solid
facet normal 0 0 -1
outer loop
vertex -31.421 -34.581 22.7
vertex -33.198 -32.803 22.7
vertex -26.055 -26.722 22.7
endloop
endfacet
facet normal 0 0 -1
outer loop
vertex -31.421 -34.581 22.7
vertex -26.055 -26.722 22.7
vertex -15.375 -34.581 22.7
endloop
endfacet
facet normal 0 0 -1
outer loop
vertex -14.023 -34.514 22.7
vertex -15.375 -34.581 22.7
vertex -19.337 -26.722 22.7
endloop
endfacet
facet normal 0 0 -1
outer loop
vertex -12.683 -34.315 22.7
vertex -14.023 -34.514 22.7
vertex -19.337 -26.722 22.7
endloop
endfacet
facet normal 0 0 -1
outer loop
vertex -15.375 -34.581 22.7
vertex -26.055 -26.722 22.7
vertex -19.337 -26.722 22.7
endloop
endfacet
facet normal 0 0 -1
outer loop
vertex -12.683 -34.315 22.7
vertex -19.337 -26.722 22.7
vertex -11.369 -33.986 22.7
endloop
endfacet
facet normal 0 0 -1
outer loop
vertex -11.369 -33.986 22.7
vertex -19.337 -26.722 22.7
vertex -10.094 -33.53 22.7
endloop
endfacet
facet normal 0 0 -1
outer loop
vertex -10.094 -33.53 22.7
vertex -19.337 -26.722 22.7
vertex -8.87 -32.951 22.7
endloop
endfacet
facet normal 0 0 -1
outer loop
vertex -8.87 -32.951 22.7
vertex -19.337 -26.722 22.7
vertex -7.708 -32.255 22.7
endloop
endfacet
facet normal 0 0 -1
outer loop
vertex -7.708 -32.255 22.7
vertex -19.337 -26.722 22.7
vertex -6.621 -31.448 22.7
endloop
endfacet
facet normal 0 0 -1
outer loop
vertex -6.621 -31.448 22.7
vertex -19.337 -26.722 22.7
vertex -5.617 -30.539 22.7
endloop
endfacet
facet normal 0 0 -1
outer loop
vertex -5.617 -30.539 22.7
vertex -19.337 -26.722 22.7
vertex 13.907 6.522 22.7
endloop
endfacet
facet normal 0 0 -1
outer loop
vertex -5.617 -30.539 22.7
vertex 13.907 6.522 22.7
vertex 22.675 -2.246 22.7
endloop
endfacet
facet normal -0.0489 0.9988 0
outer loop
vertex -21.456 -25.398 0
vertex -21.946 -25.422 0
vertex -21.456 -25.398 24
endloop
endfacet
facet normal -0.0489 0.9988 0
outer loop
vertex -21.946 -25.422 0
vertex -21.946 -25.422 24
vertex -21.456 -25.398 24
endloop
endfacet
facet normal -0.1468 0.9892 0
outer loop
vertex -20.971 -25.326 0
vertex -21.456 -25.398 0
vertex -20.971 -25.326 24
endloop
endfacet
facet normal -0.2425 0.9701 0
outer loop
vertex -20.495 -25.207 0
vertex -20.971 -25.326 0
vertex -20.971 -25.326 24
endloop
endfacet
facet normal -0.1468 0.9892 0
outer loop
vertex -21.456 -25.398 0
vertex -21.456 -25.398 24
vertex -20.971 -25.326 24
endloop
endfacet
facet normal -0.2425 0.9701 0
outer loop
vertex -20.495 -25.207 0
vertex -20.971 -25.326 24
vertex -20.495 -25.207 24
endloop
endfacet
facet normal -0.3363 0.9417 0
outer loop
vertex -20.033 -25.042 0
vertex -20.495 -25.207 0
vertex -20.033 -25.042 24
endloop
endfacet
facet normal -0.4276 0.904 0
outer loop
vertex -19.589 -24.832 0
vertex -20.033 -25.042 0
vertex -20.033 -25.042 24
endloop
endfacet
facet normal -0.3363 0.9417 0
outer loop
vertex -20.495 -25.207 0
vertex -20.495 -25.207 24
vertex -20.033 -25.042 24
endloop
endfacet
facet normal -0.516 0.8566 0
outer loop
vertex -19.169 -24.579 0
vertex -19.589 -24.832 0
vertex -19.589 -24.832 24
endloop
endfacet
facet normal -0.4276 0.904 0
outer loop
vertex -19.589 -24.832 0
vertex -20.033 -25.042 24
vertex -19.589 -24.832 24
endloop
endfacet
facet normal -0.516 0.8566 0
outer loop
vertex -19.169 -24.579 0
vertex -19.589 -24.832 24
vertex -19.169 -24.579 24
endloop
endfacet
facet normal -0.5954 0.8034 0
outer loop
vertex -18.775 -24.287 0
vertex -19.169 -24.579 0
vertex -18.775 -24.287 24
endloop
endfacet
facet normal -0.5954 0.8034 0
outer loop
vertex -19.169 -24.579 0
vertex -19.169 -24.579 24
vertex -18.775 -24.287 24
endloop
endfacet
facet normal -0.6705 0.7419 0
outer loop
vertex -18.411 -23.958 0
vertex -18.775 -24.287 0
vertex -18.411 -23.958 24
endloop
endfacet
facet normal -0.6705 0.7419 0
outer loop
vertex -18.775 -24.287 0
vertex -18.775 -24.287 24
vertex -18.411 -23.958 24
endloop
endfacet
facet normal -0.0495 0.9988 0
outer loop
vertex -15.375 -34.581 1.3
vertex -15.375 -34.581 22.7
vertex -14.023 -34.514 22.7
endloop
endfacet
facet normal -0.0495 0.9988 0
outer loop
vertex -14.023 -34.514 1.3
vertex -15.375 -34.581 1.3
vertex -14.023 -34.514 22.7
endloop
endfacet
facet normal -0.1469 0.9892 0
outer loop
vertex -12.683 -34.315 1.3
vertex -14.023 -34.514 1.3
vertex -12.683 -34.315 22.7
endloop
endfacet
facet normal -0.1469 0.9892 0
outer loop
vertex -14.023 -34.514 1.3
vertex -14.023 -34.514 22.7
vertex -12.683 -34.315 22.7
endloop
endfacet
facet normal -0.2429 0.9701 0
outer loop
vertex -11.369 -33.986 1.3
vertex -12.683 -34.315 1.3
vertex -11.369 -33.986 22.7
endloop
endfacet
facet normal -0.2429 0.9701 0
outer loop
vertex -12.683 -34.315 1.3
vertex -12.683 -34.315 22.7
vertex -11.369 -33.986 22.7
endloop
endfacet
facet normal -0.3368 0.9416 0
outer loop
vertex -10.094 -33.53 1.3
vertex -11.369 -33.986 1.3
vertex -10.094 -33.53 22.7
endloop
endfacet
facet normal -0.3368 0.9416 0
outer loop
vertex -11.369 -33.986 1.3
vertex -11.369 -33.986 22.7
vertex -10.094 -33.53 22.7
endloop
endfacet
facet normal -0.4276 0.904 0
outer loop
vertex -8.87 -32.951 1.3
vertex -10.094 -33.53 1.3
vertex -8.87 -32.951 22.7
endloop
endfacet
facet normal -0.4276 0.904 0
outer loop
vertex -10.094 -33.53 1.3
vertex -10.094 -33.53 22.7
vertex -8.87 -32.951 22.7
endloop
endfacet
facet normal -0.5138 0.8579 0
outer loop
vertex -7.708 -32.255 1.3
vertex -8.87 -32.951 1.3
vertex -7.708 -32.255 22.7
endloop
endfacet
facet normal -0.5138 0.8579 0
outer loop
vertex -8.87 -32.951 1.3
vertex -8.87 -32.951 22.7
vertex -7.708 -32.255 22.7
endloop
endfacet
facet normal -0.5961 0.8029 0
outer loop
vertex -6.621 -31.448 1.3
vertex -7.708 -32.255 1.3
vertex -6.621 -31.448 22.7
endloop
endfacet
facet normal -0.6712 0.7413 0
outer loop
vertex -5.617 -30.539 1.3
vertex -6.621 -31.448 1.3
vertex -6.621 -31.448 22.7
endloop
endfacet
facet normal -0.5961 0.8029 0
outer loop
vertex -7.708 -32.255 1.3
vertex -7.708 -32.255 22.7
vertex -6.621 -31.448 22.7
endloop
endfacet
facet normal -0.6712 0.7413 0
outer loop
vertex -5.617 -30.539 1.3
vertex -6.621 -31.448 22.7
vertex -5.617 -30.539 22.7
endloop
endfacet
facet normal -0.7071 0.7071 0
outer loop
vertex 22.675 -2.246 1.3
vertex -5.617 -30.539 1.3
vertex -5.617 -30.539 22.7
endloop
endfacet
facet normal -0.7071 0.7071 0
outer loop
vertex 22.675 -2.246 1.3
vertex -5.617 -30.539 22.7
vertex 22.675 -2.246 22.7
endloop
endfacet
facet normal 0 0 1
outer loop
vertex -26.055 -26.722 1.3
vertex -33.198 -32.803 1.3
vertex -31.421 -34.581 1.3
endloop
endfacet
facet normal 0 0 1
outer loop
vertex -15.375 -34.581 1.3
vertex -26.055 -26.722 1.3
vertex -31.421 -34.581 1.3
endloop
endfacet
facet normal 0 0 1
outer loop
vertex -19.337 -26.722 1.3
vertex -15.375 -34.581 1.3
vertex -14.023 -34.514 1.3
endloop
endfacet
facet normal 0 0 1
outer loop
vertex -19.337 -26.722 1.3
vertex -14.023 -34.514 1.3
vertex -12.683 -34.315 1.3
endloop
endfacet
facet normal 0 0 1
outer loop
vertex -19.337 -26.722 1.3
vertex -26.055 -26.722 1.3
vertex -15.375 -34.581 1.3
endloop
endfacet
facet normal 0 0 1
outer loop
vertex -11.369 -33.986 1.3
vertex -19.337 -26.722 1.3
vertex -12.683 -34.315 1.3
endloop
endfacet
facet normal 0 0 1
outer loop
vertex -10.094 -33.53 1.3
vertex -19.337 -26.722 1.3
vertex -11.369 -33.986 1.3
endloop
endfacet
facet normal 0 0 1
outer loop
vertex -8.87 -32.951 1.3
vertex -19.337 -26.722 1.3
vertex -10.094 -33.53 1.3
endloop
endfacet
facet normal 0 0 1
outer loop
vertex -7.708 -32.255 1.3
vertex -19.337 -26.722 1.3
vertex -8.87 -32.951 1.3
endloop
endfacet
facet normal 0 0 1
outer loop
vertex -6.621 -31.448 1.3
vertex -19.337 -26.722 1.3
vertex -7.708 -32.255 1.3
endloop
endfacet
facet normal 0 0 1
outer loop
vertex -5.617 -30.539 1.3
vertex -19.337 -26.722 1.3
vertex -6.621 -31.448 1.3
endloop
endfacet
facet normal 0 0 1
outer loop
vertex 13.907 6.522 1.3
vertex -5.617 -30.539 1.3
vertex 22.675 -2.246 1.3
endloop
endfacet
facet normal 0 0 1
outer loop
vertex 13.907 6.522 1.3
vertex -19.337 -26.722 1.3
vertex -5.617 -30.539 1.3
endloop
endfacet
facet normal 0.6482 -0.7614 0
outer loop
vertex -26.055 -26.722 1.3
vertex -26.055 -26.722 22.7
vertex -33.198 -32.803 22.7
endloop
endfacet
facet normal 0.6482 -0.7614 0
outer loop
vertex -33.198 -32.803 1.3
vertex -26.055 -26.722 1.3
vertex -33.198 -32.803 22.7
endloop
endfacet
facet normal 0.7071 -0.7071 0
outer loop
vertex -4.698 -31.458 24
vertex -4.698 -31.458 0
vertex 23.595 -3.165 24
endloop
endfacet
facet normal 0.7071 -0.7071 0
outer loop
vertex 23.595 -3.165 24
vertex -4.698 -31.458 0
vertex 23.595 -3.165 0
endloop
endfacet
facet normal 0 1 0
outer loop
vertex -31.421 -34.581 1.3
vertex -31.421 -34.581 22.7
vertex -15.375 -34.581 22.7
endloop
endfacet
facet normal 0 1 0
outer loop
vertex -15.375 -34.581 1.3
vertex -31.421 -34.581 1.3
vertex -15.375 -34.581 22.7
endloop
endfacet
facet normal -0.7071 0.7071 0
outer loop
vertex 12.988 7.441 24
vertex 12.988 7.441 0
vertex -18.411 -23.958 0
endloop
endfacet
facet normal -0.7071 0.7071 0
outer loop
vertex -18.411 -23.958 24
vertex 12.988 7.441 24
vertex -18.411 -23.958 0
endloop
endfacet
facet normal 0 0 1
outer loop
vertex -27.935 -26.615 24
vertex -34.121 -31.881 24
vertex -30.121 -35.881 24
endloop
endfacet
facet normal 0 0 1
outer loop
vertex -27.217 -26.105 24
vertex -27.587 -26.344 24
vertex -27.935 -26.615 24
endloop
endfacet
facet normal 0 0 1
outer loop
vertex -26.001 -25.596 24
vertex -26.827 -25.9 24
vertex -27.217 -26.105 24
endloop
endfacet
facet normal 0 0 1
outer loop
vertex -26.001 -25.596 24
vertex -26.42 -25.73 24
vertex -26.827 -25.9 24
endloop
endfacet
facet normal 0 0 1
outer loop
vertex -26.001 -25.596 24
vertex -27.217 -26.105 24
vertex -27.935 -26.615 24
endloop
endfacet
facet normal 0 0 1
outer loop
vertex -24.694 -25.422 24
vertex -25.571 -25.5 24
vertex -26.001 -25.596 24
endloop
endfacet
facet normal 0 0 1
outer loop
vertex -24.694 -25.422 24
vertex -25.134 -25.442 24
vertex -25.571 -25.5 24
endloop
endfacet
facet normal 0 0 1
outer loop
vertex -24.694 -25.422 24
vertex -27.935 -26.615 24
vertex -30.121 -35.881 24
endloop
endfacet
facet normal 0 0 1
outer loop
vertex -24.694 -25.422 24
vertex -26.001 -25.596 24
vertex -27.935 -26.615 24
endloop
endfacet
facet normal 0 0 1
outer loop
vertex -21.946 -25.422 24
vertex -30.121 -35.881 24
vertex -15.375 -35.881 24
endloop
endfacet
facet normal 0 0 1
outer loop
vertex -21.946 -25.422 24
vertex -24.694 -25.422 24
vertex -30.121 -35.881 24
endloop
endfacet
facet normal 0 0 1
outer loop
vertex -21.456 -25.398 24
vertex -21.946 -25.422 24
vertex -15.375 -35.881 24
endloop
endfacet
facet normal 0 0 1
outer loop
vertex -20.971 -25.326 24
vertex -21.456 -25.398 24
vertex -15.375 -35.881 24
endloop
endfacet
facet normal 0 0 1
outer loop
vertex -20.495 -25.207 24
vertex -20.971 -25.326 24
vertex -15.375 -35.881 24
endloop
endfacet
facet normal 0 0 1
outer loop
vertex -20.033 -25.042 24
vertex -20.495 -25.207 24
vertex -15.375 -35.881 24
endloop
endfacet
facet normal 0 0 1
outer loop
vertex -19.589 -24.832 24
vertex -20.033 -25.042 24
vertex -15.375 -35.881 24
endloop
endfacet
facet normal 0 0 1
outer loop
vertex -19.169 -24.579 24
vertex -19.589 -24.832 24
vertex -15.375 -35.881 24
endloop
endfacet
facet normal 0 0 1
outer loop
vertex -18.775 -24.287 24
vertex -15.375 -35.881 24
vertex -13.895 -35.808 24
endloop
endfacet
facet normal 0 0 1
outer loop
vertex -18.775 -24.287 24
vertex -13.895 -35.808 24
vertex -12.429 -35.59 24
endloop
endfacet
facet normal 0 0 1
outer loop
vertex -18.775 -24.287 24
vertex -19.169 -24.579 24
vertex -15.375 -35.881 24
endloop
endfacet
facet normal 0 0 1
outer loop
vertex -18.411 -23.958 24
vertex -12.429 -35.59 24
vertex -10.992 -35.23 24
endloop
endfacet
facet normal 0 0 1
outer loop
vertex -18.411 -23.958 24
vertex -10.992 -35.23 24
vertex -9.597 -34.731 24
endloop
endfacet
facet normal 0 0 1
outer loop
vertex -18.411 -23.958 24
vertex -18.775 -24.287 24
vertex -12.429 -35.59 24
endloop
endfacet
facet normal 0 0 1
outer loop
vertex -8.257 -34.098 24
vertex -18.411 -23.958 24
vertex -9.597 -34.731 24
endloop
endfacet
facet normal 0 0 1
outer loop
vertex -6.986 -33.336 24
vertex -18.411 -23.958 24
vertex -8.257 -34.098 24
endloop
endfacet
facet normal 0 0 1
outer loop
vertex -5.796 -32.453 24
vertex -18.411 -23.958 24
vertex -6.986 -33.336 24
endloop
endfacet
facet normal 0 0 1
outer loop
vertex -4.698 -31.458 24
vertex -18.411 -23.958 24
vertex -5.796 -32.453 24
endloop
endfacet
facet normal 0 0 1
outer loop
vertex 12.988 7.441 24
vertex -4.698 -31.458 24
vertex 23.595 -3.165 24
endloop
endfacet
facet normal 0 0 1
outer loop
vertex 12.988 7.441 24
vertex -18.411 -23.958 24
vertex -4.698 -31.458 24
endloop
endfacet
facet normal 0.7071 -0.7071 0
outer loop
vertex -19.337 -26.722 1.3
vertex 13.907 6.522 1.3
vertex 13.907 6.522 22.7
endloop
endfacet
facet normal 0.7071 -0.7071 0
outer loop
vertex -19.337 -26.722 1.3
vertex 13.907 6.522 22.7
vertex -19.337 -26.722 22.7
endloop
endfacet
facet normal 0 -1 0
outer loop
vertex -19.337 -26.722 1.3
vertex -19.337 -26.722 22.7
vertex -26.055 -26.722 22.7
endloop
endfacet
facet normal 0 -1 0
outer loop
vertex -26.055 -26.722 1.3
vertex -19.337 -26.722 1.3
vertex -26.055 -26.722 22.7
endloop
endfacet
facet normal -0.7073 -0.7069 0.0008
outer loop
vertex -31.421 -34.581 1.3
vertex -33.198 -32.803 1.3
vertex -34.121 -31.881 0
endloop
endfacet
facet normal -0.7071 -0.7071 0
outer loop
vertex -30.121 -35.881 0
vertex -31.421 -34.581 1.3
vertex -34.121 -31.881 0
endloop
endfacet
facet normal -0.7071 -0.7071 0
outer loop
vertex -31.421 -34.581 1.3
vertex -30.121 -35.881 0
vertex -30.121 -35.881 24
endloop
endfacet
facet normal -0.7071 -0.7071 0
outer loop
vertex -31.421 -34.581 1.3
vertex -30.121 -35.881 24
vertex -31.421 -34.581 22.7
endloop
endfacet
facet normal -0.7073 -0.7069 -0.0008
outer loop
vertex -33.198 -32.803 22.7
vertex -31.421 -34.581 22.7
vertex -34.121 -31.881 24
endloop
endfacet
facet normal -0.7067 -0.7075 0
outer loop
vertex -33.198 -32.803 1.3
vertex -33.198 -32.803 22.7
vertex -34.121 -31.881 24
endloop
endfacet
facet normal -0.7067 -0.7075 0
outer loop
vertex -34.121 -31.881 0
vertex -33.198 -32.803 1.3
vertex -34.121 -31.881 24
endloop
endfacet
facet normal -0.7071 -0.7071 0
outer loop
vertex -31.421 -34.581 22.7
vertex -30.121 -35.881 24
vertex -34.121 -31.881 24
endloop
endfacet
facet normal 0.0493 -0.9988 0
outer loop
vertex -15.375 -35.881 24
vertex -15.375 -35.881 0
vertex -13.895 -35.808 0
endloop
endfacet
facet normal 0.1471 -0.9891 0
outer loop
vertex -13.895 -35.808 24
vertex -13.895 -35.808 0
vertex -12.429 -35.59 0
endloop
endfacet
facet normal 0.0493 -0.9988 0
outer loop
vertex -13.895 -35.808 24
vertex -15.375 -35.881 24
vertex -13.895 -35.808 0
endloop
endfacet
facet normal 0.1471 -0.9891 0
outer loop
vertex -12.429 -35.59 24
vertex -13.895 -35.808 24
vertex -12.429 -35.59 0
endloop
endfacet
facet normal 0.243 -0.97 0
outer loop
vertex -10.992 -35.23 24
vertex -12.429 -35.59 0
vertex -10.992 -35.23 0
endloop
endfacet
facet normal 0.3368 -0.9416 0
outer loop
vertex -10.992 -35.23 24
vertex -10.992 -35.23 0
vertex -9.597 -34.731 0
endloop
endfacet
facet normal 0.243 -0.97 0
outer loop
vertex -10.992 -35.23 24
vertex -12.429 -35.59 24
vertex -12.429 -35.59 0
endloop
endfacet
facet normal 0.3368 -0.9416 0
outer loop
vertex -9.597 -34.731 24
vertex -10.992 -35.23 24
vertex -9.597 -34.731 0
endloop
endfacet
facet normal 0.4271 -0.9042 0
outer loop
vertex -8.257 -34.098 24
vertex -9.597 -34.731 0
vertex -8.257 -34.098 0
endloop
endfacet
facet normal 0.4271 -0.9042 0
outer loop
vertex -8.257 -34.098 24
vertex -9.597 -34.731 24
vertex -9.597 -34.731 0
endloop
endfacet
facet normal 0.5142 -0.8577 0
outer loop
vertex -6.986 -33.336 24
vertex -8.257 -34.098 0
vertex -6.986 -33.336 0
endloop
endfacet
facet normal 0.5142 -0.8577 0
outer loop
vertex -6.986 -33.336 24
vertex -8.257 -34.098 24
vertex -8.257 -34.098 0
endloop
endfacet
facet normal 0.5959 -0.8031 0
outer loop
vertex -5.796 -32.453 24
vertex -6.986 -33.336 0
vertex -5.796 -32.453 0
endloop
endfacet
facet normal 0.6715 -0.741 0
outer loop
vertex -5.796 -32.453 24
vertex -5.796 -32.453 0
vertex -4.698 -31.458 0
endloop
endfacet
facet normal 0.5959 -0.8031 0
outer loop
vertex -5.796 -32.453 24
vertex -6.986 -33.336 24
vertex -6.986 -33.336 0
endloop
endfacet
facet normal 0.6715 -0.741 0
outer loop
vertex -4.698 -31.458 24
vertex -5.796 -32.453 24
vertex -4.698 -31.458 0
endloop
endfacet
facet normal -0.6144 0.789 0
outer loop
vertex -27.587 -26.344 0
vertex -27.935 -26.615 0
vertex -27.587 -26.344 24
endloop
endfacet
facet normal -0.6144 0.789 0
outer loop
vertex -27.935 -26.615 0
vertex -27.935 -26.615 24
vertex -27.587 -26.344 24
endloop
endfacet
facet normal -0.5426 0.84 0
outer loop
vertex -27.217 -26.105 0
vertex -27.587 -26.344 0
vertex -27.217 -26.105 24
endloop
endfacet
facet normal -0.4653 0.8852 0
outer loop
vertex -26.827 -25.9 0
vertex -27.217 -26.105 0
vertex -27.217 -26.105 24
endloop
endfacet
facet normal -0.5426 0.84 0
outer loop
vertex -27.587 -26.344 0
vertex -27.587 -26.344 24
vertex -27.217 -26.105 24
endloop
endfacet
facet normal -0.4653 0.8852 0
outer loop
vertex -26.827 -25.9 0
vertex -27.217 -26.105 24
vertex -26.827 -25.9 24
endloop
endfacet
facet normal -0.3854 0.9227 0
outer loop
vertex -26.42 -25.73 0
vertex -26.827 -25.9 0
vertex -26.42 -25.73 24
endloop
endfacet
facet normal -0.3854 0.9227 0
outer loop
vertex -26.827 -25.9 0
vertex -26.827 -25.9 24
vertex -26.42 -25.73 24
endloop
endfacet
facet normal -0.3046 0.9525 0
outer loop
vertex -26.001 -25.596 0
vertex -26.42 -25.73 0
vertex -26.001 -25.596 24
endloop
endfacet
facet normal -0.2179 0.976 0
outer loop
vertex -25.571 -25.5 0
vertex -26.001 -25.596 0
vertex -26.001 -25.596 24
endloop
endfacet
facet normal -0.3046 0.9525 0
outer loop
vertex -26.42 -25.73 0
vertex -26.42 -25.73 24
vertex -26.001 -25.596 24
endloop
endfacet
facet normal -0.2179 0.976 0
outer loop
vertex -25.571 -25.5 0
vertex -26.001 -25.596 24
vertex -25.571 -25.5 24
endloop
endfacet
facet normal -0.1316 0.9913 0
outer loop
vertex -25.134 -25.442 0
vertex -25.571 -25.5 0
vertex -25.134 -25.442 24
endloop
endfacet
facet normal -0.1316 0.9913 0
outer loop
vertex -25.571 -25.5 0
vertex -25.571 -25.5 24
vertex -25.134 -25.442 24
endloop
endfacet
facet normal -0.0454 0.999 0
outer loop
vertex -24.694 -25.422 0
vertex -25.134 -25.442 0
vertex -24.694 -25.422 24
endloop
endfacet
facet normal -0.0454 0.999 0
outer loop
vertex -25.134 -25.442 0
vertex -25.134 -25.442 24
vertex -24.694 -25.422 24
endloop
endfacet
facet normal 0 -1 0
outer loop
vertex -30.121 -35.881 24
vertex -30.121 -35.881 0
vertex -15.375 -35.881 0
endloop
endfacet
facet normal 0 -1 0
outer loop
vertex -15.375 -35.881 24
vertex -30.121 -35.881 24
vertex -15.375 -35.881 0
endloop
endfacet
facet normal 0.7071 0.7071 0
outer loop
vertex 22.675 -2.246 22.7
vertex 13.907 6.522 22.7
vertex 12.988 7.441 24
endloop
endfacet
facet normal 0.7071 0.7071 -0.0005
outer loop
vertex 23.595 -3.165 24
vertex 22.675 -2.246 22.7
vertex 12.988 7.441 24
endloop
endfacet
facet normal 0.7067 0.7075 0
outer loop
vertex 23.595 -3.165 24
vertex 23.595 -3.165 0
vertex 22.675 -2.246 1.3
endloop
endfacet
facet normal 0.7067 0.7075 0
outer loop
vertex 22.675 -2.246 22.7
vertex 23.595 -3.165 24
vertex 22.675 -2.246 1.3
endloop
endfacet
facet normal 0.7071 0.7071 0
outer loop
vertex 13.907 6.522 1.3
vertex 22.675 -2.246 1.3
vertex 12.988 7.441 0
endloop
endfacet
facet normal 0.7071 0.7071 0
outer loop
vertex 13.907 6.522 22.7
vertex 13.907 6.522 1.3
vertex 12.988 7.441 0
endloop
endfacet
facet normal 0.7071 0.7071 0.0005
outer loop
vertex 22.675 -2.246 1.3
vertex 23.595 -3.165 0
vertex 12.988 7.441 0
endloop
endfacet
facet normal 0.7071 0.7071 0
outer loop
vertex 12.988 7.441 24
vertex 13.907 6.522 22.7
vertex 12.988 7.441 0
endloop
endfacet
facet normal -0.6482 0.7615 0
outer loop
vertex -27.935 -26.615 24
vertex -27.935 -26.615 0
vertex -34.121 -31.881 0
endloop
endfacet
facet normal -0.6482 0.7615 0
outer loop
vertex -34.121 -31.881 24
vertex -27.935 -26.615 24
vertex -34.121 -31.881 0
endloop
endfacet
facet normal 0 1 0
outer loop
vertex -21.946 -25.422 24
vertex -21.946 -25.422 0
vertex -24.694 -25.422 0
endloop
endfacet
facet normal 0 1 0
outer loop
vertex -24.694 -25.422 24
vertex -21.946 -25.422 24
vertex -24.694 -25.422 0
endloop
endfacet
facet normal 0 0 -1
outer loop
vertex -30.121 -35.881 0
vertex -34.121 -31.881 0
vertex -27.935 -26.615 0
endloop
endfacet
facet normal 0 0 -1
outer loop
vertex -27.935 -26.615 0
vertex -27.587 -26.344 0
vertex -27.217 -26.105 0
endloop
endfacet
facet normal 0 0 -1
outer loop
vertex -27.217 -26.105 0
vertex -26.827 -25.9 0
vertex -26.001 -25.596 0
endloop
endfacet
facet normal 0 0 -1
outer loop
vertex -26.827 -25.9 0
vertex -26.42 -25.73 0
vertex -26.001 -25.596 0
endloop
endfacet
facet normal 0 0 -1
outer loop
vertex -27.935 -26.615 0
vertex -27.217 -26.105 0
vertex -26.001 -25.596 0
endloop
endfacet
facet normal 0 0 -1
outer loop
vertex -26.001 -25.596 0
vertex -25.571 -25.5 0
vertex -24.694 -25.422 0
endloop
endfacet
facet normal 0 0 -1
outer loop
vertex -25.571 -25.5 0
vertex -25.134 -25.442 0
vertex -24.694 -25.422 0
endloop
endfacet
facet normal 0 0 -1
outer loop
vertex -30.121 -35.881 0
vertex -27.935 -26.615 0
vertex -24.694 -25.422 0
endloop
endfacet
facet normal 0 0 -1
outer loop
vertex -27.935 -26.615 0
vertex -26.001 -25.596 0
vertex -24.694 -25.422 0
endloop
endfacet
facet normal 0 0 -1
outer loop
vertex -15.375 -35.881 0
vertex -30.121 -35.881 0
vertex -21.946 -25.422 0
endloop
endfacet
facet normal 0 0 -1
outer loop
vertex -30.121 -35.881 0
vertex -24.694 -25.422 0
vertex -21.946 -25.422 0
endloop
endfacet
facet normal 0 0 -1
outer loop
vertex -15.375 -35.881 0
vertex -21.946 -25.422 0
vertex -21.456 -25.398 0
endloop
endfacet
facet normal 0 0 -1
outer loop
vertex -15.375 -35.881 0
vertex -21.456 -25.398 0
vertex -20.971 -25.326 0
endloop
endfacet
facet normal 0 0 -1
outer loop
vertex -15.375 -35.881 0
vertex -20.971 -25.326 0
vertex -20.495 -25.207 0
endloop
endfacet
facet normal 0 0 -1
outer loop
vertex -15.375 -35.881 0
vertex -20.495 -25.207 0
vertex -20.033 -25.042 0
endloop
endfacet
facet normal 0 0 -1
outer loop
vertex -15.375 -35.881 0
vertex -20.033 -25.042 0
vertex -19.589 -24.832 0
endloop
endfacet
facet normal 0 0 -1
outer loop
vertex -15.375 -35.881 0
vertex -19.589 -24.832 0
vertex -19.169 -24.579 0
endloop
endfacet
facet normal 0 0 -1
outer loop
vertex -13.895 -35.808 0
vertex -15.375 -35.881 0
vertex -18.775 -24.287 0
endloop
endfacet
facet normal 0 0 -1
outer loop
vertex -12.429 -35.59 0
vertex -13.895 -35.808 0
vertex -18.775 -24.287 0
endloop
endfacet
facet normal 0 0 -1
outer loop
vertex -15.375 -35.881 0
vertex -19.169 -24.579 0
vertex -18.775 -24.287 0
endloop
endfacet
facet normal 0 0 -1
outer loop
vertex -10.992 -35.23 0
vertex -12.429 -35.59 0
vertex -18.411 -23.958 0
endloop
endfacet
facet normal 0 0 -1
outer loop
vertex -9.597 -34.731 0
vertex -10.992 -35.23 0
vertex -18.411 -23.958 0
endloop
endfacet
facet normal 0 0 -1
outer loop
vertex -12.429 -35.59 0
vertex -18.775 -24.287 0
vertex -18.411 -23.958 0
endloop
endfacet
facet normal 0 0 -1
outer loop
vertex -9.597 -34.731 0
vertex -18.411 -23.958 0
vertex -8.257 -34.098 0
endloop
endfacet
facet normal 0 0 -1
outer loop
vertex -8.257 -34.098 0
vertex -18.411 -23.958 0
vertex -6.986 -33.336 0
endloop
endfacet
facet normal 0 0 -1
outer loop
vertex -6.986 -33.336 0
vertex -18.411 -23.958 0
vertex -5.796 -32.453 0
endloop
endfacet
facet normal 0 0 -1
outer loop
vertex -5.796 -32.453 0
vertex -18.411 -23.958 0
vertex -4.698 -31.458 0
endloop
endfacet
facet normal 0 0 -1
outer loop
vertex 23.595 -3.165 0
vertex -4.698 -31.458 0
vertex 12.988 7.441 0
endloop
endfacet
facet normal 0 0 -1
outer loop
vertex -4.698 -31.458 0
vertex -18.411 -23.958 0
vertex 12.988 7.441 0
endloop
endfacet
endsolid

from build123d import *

# Parameters (mm, degrees)
F1_DEPTH = 24
F2_R     = 15.1
F3_T     = -1.3
F5_DEPTH = 24.001
F6_R     = 5


with BuildPart() as f1:
    # F0 (on Top) → F1 (new body)
    with BuildSketch(Plane.XY):
        Polygon((-26.533620432, -25.4221484065), (-34.1206180562, -31.880568529), (-34.1206180562, -35.880568529), (-9.1206180562, -35.880568529), (23.5945900374, -3.1653604354), (12.9879883196, 7.4412412824), (-19.8754013693, -25.4221484065), align=None)
    extrude(amount=F1_DEPTH)

    # F2
    f2_edges = [f1.edges().sort_by_distance(p)[0] for p in [
        (-9.120618, -35.880569, 12),
    ]]
    fillet(f2_edges, radius=F2_R)

    # F3
    f3_openings = [f1.faces().sort_by_distance(p)[0] for p in [
        (-34.120618, -33.880569, 12),
        (18.291289, 2.13794, 12),
    ]]
    offset(amount=F3_T, openings=f3_openings, kind=Kind.INTERSECTION)

    # F4 (on face) → F5 (cut, through all)
    with BuildSketch(Plane.XY.offset(24)):
        Polygon((-30.1206180562, -35.880568529), (-34.1206180562, -31.880568529), (-34.1206180562, -35.880568529), align=None)
    extrude(amount=-F5_DEPTH, mode=Mode.SUBTRACT)

    # F6
    f6_edges = [f1.edges().sort_by_distance(p)[0] for p in [
        (-26.53362, -25.422148, 12),
        (-19.875401, -25.422148, 12),
    ]]
    fillet(f6_edges, radius=F6_R)


solid = f1.part
